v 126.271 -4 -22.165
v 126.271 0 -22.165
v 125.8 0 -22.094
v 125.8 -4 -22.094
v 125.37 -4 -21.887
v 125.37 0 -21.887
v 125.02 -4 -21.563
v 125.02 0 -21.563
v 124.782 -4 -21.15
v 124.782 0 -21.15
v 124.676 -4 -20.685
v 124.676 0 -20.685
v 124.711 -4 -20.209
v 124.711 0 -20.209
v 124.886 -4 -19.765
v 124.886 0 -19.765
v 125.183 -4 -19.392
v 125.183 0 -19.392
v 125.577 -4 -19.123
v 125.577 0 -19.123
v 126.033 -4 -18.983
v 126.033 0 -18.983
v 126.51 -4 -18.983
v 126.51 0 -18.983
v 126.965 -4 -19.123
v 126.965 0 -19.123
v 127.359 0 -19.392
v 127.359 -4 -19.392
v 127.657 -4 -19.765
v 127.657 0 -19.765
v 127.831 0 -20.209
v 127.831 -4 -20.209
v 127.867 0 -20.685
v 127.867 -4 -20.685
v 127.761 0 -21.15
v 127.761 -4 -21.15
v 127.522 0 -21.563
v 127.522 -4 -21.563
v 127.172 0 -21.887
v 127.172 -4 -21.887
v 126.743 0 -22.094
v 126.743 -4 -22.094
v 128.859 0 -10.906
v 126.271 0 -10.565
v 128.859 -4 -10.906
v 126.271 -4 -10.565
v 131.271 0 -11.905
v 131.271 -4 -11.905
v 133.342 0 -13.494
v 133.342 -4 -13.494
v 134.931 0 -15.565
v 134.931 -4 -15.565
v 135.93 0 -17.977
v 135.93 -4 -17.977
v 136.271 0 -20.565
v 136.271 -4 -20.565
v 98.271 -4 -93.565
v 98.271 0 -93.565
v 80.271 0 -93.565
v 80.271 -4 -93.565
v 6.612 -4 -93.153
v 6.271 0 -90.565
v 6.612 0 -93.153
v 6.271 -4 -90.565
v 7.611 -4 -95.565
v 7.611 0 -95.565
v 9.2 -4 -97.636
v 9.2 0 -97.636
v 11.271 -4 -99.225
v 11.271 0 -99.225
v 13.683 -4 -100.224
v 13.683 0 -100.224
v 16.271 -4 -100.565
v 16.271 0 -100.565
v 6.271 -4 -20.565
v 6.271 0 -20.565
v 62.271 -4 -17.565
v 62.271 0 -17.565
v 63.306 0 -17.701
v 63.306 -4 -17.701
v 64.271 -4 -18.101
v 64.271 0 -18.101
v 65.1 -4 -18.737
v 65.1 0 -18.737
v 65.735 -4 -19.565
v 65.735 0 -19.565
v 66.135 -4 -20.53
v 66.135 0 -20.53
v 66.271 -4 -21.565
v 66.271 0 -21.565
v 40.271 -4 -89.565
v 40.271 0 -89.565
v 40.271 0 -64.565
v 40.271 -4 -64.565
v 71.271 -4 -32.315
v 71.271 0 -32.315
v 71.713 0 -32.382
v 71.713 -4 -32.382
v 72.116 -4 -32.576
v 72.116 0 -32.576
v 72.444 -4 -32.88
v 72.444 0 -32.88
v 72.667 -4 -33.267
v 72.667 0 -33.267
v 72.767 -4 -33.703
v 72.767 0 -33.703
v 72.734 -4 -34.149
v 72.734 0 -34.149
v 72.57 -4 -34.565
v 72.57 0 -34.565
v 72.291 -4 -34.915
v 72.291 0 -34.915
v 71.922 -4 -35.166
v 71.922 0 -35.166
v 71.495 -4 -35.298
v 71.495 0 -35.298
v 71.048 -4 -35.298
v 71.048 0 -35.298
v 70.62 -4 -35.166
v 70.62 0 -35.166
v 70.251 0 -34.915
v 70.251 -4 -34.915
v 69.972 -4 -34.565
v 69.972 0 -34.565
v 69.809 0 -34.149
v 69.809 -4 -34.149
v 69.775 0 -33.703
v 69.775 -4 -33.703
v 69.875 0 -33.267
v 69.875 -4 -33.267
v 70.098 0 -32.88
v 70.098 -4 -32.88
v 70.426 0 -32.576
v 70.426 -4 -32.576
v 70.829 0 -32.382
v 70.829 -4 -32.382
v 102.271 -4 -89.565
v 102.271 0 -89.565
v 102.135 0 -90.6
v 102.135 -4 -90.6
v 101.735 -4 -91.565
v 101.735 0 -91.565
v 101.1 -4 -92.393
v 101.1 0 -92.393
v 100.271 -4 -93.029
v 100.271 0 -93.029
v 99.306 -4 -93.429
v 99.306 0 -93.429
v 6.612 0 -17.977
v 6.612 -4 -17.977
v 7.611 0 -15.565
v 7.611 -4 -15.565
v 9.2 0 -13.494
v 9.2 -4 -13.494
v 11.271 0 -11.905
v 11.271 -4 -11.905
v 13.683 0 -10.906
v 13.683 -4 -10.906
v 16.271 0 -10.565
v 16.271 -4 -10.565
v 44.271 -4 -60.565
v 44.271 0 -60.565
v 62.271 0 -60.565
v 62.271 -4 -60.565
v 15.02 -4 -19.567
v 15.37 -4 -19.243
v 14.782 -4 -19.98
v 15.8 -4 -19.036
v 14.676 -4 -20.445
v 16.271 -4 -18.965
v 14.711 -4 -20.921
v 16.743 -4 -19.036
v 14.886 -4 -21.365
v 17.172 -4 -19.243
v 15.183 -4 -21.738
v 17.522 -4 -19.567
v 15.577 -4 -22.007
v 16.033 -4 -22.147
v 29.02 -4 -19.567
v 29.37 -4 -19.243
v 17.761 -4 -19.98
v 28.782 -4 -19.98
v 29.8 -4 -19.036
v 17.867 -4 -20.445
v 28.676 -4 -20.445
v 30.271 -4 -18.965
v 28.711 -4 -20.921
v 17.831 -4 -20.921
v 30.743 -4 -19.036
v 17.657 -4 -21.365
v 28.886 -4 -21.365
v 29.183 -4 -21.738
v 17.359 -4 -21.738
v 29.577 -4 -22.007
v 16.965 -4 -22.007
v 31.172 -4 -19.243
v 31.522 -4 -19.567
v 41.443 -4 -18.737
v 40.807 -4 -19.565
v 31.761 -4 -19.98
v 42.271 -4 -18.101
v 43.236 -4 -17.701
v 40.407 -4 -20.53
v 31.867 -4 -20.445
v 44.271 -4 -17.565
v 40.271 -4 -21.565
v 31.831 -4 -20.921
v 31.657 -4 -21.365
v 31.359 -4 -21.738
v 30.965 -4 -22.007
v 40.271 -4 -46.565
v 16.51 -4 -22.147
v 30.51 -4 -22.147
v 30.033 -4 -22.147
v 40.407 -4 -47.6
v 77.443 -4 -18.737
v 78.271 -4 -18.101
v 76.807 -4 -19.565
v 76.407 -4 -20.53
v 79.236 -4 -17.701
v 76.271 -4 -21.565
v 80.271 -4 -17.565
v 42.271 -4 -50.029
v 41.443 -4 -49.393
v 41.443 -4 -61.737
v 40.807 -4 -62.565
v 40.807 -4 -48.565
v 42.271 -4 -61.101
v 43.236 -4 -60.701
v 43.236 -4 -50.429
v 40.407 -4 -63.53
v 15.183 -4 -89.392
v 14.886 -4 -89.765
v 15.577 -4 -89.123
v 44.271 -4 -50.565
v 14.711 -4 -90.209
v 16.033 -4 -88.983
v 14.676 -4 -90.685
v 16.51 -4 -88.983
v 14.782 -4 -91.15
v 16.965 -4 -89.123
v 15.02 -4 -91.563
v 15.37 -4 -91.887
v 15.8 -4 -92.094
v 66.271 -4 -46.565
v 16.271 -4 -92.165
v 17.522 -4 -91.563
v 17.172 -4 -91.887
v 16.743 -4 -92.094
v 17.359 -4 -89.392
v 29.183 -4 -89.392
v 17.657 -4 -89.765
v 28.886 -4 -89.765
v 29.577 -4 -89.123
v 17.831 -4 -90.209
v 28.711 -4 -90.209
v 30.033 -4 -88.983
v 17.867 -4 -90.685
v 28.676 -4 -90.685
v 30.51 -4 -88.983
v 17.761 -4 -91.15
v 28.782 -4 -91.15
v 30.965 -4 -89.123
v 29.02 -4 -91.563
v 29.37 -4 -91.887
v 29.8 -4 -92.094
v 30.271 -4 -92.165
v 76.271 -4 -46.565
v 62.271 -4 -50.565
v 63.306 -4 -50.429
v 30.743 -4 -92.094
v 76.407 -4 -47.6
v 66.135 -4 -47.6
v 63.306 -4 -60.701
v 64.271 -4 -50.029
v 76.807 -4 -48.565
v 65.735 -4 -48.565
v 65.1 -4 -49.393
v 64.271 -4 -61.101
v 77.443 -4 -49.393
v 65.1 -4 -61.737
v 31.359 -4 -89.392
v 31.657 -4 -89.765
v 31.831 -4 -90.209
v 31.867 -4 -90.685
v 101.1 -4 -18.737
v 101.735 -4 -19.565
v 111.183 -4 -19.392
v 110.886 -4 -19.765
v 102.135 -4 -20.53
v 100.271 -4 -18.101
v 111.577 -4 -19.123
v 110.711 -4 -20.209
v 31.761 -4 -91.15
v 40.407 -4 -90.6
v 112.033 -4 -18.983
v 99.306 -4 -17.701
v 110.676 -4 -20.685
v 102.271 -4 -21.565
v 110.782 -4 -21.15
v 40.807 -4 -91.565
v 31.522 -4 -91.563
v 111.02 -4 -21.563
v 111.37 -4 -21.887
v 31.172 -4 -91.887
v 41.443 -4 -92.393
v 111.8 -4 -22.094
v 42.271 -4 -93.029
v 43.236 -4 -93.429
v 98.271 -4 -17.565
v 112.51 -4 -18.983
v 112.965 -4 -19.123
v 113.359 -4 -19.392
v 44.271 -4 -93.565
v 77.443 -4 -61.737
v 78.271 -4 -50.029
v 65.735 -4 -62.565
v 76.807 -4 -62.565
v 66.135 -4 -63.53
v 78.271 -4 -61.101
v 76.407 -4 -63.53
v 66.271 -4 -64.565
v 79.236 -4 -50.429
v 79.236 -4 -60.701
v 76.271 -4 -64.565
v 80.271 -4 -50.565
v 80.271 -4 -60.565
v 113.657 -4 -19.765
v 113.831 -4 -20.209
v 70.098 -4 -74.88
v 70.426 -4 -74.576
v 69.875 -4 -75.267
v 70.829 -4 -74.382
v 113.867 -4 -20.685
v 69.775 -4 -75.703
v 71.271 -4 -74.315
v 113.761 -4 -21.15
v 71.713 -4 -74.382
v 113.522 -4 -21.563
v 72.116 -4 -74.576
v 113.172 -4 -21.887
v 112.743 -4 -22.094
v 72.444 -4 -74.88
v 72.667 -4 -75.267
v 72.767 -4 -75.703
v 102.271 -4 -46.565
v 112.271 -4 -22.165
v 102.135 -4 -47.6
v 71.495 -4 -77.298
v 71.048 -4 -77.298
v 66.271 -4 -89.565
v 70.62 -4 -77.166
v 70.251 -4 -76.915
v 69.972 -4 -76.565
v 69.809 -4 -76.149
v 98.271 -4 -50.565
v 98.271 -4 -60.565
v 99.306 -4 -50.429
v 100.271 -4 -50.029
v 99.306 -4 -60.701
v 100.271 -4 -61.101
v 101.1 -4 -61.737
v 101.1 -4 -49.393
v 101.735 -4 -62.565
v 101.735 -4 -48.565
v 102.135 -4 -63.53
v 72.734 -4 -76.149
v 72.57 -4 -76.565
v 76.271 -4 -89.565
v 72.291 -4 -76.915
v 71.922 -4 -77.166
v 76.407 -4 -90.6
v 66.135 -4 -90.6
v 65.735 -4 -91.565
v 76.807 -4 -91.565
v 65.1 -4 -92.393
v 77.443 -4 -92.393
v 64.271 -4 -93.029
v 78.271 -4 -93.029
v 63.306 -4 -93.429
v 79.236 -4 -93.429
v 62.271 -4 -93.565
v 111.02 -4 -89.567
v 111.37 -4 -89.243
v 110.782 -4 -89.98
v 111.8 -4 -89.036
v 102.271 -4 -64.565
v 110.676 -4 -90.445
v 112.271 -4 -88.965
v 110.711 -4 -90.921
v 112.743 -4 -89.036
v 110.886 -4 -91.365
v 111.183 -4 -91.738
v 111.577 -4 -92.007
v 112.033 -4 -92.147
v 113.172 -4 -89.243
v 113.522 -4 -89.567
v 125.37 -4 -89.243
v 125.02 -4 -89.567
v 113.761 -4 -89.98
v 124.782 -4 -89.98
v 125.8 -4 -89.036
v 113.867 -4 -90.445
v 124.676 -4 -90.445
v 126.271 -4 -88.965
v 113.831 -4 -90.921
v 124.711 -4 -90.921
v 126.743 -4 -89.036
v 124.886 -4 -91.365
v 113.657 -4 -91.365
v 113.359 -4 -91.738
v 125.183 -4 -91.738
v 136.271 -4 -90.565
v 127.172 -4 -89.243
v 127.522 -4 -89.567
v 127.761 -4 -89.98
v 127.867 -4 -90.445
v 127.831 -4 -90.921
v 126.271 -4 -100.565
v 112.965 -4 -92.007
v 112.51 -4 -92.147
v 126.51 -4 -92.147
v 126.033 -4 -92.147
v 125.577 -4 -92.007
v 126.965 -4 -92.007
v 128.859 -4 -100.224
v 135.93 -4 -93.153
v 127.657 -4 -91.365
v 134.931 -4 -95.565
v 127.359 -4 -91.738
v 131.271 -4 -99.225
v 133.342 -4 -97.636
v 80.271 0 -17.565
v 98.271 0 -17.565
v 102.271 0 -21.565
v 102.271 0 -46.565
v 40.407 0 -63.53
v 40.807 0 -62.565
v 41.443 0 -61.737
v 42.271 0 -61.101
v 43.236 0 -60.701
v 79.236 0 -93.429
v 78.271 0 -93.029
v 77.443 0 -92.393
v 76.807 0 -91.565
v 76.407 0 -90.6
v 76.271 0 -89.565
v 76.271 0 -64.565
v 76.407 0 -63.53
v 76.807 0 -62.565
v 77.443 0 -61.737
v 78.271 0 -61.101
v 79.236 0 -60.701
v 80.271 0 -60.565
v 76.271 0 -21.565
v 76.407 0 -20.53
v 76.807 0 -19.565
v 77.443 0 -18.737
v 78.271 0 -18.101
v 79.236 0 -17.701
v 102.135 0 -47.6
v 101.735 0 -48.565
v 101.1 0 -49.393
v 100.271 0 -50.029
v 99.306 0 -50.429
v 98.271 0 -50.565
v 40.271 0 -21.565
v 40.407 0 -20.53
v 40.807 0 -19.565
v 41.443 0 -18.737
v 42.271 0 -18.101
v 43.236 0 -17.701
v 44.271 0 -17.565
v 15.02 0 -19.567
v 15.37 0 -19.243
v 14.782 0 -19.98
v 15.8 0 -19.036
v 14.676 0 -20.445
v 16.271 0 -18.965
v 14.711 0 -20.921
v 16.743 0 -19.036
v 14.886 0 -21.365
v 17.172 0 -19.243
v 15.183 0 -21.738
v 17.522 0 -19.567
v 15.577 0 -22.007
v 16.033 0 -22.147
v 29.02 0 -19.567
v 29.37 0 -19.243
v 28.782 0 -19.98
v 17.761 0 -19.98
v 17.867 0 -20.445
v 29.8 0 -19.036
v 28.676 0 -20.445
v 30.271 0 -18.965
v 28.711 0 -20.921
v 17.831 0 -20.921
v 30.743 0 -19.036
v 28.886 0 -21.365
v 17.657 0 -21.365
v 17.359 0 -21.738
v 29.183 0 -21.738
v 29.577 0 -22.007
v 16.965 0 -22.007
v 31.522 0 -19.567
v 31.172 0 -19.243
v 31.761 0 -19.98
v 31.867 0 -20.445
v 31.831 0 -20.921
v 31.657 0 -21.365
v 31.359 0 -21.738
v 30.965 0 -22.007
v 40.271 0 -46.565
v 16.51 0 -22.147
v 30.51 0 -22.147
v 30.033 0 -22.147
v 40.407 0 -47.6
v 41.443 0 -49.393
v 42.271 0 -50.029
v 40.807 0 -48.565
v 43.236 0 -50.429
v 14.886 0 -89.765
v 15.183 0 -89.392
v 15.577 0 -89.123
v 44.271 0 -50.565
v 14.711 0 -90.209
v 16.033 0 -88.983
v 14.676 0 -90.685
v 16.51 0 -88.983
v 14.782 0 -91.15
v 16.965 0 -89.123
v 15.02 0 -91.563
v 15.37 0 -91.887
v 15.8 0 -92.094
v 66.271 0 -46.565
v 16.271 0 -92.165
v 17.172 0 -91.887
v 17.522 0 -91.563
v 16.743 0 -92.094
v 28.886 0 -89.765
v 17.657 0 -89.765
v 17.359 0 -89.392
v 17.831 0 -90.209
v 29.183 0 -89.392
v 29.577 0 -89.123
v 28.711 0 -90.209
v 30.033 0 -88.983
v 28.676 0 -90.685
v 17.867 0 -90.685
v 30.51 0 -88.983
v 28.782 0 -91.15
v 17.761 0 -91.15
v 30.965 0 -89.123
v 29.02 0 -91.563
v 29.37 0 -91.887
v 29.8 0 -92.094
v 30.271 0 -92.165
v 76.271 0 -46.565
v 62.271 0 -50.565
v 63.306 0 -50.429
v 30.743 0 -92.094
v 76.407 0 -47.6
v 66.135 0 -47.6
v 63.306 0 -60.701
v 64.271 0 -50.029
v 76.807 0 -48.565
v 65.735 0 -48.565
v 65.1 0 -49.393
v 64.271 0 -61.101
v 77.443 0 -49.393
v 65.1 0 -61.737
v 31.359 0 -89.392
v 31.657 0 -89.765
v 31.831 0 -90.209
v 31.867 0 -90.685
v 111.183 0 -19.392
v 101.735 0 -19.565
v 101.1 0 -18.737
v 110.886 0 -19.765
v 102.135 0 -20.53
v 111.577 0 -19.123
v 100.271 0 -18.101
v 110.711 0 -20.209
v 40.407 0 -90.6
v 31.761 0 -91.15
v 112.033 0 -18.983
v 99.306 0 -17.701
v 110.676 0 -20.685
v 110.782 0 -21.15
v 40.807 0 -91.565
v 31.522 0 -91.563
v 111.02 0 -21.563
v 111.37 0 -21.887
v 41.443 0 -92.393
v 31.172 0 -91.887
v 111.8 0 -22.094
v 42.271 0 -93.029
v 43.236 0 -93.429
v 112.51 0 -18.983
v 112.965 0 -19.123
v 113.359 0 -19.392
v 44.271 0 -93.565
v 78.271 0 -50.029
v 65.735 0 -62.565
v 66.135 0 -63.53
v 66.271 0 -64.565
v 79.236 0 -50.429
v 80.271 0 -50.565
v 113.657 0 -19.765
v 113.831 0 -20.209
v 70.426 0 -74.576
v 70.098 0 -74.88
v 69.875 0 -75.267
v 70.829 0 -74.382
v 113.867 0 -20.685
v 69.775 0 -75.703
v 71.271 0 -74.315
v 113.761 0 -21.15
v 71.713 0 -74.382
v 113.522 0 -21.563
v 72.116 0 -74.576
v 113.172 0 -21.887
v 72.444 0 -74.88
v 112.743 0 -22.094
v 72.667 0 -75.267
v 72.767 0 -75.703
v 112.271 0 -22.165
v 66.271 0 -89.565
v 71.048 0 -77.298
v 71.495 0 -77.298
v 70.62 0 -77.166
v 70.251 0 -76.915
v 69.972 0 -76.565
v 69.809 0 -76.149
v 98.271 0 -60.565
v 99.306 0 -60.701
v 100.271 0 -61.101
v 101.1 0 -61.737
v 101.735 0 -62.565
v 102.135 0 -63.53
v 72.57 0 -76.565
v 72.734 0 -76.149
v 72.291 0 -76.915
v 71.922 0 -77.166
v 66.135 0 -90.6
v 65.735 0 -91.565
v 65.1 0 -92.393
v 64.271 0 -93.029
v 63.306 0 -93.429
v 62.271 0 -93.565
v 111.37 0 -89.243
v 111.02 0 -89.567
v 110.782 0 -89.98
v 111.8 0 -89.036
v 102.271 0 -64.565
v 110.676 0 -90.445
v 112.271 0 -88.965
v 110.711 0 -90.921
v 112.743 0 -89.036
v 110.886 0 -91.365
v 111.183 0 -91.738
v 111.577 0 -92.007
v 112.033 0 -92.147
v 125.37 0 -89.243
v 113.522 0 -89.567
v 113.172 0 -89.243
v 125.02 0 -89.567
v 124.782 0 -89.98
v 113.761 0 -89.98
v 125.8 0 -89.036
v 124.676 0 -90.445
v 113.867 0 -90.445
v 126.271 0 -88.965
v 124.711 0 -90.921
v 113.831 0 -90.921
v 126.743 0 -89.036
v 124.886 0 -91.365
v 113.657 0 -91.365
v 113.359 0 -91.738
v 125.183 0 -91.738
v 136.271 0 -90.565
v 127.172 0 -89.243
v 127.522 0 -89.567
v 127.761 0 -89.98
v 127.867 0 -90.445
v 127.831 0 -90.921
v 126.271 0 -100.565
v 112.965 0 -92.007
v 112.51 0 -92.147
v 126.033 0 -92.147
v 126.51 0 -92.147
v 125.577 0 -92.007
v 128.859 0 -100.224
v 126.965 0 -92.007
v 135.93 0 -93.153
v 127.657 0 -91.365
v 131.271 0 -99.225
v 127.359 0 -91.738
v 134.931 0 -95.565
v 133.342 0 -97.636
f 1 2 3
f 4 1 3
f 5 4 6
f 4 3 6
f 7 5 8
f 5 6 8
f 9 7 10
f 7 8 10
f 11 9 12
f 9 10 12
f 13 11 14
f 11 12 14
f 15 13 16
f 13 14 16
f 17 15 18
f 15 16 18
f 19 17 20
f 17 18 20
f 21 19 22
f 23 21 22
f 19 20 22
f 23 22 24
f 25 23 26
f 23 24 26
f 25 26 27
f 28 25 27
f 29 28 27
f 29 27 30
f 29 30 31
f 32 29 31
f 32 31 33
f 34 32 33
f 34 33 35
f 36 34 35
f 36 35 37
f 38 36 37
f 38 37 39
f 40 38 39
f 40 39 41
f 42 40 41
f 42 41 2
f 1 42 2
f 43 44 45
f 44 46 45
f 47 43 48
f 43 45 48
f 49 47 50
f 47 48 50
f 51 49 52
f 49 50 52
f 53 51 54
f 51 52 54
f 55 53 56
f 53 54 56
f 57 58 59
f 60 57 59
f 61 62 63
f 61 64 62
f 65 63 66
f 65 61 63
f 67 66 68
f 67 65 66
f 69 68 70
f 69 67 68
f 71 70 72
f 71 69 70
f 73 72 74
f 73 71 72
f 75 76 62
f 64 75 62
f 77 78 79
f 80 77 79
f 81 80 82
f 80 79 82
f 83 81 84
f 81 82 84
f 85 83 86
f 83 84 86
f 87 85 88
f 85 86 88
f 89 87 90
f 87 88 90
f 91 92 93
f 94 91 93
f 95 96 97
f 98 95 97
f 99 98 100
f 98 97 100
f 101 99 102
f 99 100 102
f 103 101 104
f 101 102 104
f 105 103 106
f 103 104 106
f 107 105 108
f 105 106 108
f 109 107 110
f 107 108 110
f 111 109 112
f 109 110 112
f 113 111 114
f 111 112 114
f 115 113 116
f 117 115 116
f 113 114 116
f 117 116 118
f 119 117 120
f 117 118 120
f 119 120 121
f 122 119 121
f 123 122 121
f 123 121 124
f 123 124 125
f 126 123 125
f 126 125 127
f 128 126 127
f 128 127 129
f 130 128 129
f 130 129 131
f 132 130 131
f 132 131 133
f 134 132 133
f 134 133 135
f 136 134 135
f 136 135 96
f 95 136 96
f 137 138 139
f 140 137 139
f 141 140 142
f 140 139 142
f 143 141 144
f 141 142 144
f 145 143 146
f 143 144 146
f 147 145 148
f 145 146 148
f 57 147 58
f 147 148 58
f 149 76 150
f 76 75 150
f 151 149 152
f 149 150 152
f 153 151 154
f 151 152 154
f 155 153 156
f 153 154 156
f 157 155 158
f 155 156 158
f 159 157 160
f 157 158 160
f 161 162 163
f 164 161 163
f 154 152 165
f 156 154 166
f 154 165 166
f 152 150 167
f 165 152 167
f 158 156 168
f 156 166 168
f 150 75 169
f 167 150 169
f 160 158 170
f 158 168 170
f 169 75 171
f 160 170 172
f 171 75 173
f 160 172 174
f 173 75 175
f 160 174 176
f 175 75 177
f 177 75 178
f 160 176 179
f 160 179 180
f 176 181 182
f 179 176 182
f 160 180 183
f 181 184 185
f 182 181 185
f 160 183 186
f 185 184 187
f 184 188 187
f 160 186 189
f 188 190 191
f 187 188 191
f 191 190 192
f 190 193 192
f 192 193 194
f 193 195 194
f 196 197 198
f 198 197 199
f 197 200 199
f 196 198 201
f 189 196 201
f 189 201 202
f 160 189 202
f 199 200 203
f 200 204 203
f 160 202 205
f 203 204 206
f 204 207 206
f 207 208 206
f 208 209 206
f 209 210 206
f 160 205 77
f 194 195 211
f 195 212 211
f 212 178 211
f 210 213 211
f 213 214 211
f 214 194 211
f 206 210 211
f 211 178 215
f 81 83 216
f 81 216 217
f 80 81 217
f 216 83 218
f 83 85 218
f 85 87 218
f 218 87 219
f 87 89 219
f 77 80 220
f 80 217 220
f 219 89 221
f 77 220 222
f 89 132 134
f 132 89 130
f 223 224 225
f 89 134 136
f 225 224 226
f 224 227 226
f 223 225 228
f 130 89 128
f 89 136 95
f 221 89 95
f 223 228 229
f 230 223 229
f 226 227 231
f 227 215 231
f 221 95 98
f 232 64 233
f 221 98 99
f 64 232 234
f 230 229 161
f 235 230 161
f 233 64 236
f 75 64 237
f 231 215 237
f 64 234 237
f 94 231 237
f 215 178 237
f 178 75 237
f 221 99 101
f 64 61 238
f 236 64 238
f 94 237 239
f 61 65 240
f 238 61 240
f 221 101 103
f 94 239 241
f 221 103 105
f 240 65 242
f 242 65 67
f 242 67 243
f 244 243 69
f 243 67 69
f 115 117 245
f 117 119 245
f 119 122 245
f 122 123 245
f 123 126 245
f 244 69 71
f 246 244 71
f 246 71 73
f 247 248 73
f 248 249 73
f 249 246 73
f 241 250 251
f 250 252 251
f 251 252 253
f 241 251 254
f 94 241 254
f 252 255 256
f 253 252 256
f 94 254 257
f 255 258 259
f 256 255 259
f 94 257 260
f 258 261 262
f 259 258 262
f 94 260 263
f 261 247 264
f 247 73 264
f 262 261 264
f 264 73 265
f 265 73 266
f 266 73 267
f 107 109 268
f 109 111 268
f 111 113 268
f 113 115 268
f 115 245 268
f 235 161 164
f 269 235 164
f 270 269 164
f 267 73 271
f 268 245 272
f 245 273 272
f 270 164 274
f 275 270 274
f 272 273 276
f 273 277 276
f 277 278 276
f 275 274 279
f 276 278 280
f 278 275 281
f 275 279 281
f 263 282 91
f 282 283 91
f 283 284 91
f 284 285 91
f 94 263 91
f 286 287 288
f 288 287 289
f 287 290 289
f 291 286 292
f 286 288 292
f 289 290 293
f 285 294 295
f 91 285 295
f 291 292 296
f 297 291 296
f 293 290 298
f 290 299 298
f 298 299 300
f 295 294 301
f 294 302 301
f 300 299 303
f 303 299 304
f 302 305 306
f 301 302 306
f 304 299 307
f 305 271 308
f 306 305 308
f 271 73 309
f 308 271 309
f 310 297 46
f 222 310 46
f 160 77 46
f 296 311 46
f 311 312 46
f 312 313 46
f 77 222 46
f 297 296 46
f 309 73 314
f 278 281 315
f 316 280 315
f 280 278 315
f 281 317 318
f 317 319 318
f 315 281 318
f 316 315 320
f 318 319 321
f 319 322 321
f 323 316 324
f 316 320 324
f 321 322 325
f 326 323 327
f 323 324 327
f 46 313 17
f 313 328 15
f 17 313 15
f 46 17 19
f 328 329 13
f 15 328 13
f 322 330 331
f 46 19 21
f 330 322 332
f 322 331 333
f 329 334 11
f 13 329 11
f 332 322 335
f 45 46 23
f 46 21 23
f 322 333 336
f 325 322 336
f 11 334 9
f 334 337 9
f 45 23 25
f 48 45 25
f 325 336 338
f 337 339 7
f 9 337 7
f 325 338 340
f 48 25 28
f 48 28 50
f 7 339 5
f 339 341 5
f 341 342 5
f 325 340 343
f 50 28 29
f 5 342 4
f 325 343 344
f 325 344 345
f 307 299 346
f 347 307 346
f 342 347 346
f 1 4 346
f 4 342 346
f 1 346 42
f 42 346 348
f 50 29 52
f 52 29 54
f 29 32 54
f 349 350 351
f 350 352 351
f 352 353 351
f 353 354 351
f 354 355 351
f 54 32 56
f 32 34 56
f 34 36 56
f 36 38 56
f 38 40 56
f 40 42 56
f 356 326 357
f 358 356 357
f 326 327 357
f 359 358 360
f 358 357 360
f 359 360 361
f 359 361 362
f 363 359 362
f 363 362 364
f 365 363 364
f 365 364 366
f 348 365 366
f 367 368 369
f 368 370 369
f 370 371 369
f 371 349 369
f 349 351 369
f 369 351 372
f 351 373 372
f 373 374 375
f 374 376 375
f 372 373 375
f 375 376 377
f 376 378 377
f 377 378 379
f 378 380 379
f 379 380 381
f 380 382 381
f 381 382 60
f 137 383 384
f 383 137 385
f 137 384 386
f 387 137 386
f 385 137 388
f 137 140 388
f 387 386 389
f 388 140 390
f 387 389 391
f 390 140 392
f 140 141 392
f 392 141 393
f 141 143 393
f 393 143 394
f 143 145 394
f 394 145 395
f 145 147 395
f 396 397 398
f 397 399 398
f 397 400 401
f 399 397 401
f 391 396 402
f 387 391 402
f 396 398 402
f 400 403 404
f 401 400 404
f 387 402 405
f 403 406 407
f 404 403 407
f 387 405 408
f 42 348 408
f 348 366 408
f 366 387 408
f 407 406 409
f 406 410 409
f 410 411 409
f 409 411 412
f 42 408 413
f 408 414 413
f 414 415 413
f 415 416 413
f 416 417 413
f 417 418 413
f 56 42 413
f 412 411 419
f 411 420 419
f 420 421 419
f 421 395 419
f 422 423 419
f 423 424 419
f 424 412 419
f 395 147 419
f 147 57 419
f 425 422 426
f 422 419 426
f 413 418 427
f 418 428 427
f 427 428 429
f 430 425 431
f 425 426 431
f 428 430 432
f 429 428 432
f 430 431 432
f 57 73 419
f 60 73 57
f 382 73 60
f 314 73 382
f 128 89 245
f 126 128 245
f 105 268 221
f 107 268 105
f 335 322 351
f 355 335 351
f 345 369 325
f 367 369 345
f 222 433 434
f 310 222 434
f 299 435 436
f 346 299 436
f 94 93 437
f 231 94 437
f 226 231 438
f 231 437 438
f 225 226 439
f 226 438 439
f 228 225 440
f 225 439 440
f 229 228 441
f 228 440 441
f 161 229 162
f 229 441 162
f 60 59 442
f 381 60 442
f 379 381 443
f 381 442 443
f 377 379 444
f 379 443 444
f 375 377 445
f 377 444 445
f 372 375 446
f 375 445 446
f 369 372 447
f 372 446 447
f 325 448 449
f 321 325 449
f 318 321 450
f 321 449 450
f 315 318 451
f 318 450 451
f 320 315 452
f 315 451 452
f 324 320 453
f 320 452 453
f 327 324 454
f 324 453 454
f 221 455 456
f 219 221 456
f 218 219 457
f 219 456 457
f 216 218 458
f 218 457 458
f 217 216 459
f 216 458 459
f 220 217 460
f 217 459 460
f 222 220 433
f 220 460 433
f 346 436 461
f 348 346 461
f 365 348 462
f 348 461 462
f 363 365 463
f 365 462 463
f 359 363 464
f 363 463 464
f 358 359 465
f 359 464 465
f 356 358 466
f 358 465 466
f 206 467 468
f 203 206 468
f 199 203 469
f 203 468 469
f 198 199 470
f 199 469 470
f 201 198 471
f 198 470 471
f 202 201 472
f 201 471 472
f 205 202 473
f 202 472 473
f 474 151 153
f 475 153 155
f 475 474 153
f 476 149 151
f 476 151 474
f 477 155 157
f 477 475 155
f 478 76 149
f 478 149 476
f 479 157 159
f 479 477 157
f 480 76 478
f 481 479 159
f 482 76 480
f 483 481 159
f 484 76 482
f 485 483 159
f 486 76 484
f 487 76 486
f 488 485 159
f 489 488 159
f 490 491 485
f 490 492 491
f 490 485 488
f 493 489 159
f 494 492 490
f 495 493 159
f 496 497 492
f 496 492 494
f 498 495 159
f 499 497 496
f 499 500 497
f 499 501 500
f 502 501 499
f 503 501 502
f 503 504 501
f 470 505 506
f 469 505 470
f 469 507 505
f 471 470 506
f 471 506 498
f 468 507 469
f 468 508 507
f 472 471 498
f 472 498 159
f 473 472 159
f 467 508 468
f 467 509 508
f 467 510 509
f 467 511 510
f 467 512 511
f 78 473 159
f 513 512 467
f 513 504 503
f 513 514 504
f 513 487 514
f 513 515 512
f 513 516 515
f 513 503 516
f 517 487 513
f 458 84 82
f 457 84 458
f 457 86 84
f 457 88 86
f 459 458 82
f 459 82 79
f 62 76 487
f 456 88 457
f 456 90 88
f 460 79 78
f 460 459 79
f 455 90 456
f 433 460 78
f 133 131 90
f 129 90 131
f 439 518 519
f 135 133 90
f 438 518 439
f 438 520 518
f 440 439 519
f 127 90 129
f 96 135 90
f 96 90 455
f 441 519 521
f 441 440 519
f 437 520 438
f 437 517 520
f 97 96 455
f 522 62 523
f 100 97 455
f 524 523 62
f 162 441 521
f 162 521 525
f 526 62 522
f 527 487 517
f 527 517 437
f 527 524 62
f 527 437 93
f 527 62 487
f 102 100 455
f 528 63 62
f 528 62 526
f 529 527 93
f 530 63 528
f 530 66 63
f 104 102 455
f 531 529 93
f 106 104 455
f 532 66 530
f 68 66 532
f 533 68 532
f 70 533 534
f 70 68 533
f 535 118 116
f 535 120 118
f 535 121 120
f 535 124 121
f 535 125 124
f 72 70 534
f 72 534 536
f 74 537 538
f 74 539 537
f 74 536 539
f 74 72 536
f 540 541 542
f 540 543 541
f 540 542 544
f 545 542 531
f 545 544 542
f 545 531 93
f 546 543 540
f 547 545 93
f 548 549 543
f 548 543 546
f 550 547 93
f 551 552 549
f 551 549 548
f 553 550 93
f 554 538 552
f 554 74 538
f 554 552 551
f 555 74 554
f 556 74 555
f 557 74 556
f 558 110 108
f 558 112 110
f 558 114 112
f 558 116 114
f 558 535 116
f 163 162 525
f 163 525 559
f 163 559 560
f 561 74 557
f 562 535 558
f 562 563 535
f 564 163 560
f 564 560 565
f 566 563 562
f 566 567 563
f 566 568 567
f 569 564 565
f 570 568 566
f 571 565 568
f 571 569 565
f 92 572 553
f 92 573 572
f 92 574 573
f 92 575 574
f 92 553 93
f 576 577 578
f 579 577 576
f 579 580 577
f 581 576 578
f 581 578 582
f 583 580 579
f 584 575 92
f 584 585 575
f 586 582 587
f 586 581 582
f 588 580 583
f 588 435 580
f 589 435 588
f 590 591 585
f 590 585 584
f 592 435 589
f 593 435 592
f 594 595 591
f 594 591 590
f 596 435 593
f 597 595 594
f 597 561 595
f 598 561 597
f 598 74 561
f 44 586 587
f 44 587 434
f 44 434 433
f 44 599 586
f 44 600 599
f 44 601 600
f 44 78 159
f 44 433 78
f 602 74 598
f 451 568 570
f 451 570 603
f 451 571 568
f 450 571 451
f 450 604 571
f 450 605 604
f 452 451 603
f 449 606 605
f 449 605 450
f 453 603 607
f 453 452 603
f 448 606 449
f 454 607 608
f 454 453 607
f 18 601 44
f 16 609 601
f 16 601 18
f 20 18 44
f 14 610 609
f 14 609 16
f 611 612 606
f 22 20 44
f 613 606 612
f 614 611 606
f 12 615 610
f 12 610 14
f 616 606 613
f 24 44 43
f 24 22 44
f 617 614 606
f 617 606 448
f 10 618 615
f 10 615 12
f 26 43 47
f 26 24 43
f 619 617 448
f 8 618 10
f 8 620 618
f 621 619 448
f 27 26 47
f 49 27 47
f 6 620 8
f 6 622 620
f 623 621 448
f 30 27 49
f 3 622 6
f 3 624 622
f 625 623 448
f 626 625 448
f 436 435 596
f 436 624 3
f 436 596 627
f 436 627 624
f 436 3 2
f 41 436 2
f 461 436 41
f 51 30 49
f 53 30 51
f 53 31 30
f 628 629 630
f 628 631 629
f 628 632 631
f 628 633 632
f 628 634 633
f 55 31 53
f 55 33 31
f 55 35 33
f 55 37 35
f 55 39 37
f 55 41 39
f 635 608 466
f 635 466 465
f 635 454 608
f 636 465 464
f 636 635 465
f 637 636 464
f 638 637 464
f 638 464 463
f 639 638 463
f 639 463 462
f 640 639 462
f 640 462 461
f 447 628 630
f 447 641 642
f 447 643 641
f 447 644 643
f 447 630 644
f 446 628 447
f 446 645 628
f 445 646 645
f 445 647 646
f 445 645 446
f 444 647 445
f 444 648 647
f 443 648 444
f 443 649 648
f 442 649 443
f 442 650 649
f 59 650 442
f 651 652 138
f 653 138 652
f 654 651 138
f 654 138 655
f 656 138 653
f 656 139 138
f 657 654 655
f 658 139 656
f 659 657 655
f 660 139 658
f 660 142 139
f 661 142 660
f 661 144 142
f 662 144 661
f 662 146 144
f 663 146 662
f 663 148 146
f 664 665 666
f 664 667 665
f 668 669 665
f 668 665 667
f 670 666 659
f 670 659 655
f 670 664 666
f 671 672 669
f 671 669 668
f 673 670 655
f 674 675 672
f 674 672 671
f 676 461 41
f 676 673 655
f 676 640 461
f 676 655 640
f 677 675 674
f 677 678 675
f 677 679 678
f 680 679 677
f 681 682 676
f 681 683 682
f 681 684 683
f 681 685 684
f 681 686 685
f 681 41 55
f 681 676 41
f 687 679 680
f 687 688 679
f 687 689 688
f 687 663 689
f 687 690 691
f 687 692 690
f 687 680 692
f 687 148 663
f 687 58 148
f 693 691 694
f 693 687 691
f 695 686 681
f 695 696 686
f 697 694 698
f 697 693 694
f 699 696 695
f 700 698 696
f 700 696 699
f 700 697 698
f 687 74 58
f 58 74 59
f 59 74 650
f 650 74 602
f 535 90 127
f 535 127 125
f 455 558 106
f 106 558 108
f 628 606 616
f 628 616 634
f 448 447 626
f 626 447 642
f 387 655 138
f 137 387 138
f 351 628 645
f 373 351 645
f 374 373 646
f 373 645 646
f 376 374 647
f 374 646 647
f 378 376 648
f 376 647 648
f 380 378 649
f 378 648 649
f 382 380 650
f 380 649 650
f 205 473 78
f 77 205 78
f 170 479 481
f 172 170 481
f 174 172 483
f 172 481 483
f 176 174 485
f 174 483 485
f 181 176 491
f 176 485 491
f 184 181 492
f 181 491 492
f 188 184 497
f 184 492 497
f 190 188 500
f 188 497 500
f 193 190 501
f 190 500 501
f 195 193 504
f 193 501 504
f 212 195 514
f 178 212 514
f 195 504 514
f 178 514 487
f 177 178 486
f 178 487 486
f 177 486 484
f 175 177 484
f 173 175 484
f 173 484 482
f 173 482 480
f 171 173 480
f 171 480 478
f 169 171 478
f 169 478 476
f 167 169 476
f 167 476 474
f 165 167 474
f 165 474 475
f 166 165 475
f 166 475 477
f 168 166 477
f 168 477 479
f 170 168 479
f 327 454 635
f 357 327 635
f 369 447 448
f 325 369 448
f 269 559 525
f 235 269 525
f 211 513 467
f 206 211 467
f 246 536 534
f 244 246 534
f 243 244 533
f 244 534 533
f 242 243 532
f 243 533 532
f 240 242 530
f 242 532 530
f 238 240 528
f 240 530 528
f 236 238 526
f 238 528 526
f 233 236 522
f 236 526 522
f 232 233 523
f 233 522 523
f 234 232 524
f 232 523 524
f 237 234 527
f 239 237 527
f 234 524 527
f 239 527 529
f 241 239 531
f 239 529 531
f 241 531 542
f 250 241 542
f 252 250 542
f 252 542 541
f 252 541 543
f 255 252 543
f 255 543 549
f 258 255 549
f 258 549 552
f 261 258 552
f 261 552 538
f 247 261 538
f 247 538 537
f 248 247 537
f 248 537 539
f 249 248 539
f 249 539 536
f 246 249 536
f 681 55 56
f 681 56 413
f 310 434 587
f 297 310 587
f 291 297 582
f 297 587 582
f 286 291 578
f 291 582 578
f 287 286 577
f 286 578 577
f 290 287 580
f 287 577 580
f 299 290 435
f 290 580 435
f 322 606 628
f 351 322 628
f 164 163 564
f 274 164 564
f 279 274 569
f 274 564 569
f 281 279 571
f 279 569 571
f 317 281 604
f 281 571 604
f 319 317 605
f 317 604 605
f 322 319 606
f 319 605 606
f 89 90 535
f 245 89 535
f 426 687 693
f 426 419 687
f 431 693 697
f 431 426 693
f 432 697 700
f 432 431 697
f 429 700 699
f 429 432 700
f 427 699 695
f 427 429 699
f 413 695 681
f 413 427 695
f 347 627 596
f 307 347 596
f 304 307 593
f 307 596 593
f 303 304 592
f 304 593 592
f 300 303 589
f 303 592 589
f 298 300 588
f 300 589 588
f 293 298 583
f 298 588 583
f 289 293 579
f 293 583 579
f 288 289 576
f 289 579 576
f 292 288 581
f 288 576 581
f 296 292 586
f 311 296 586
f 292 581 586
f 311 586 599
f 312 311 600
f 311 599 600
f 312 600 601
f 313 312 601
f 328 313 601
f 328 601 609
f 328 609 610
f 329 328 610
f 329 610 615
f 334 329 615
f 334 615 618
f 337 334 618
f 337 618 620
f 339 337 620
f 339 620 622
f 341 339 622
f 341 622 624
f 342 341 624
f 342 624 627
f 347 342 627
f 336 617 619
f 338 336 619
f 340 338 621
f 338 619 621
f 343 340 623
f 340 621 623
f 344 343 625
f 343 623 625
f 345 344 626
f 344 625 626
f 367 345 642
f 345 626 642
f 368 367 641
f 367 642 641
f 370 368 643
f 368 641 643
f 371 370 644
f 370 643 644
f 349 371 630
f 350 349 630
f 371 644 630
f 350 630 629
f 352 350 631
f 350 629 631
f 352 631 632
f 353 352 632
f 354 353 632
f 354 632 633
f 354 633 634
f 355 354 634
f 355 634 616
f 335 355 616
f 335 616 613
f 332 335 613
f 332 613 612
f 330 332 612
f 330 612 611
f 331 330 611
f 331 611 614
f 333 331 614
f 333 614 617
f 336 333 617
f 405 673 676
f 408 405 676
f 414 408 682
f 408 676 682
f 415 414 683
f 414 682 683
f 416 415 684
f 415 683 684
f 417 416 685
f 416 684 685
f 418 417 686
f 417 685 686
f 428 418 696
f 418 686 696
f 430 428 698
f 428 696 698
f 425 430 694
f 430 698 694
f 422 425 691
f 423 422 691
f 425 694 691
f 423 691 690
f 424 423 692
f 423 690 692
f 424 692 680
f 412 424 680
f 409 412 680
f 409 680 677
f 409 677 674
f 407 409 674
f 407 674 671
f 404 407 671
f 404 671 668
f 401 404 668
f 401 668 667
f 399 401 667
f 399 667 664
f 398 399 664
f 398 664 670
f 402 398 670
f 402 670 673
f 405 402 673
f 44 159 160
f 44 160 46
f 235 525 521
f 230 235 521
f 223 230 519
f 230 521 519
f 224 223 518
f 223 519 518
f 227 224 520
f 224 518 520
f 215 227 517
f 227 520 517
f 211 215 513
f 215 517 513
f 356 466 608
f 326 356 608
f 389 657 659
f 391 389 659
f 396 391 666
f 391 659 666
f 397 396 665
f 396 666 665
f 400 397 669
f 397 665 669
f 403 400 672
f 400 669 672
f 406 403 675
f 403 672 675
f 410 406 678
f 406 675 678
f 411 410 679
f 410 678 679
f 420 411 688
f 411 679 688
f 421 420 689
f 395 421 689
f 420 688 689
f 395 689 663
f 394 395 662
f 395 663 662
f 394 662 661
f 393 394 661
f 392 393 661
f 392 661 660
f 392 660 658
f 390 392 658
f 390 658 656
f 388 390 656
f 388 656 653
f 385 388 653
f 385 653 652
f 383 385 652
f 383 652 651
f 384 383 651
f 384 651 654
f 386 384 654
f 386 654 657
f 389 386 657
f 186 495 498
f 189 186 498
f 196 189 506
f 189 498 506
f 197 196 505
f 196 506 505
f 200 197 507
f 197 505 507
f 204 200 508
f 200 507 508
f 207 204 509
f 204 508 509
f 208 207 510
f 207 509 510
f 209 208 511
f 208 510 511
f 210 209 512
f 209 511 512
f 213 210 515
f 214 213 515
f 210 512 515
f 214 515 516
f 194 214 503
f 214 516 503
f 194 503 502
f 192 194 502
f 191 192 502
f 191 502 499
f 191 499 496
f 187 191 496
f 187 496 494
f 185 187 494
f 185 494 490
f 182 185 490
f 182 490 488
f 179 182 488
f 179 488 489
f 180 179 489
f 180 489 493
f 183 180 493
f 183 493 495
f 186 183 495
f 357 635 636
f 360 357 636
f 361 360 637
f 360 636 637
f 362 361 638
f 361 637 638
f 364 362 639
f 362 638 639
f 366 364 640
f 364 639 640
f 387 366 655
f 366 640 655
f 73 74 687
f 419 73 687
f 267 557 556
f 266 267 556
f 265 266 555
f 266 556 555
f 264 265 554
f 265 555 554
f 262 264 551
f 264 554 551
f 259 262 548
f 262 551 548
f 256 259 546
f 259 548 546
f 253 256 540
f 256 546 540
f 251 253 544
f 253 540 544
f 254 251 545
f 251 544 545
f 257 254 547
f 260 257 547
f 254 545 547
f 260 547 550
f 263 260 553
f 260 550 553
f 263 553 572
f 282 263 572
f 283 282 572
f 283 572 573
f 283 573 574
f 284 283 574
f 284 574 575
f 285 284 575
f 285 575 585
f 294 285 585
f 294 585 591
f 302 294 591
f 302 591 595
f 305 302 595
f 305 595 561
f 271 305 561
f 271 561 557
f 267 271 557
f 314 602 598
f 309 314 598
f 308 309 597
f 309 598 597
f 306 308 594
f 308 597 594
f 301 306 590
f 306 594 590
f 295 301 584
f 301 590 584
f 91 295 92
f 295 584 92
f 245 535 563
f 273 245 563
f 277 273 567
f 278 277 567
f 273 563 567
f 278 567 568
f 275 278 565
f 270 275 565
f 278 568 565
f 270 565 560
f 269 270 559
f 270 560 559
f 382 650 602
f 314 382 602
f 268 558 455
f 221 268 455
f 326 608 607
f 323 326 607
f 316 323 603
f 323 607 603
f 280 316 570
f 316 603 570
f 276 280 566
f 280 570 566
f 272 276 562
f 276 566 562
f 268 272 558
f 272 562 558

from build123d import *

# Parameters (mm, degrees)
SKETCH2_W           = 130
SKETCH2_H           = 90
BOSS_EXTRUDE1_DEPTH = 4
SKETCH3_R           = 1.5
CUT_EXTRUDE1_DEPTH  = 10
SKETCH4_R           = 1.6
CUT_EXTRUDE2_DEPTH  = 10
FILLET1_R           = 10
CUT_EXTRUDE3_DEPTH  = 10
SKETCH6_R           = 1.5
BOSS_EXTRUDE2_DEPTH = 4
SKETCH7_R           = 1.5
CUT_EXTRUDE4_DEPTH  = 10


with BuildPart() as part:
    # Sketch2 → Boss-Extrude1 (new body)
    with BuildSketch(Plane(origin=(0, 0, 0), x_dir=(1, 0, 0), z_dir=(0, 1, 0))):
        with Locations((71.271186441, 55.564971751)):
            Rectangle(SKETCH2_W, SKETCH2_H)
    extrude(amount=-BOSS_EXTRUDE1_DEPTH)

    # Sketch3 → Cut-Extrude1 (cut)
    with BuildSketch(Plane(origin=(0, 0, 0), x_dir=(1, 0, 0), z_dir=(0, 1, 0))):
        with Locations(Location((126.271186441, 63.564971751, 0), (0, 0, 270))):
            Circle(SKETCH3_R)
        with Locations(Location((126.271186441, 47.564971751, 0), (0, 0, 270))):
            Circle(SKETCH3_R)
        with Locations(Location((112.271186441, 47.564971751, 0), (0, 0, 270))):
            Circle(SKETCH3_R)
        with Locations(Location((112.271186441, 63.564971751, 0), (0, 0, 270))):
            Circle(SKETCH3_R)
        with Locations(Location((16.271186441, 47.564971751, 0), (0, 0, 90))):
            Circle(SKETCH3_R)
        with Locations(Location((30.271186441, 47.564971751, 0), (0, 0, 90))):
            Circle(SKETCH3_R)
        with Locations(Location((16.271186441, 63.564971751, 0), (0, 0, 90))):
            Circle(SKETCH3_R)
        with Locations(Location((30.271186441, 63.564971751, 0), (0, 0, 90))):
            Circle(SKETCH3_R)
    extrude(amount=-CUT_EXTRUDE1_DEPTH, mode=Mode.SUBTRACT)

    # Sketch4 → Cut-Extrude2 (cut)
    with BuildSketch(Plane(origin=(0, 0, 0), x_dir=(1, 0, 0), z_dir=(0, 1, 0))):
        with Locations(Location((16.271186441, 20.564971751, 0), (0, 0, 270))):
            Circle(SKETCH4_R)
        with Locations(Location((30.271186441, 20.564971751, 0), (0, 0, 270))):
            Circle(SKETCH4_R)
        with Locations(Location((30.271186441, 90.564971751, 0), (0, 0, 90))):
            Circle(SKETCH4_R)
        with Locations(Location((16.271186441, 90.564971751, 0), (0, 0, 90))):
            Circle(SKETCH4_R)
        with Locations(Location((112.271186441, 20.564971751, 0), (0, 0, 90))):
            Circle(SKETCH4_R)
        with Locations(Location((126.271186441, 20.564971751, 0), (0, 0, 90))):
            Circle(SKETCH4_R)
        with Locations(Location((126.271186441, 90.564971751, 0), (0, 0, 270))):
            Circle(SKETCH4_R)
        with Locations(Location((112.271186441, 90.564971751, 0), (0, 0, 270))):
            Circle(SKETCH4_R)
    extrude(amount=-CUT_EXTRUDE2_DEPTH, mode=Mode.SUBTRACT)

    # Fillet1
    fillet1_edges = [part.edges().sort_by_distance(p)[0] for p in [
        (6.271186441, -2, -100.564971751),
        (136.271186441, -2, -100.564971751),
        (136.271186441, -2, -10.564971751),
        (6.271186441, -2, -10.564971751),
    ]]
    fillet(fillet1_edges, radius=FILLET1_R)

    # Sketch5 → Cut-Extrude3 (cut)
    with BuildSketch(Plane(origin=(0, 0, 0), x_dir=(1, 0, 0), z_dir=(0, 1, 0))):
        with BuildLine():
            Line((76.271186441, 89.564971751), (76.271186441, 64.564971751))
            ThreePointArc((76.271186441, 64.564971751), (77.442759316, 61.736544627), (80.271186441, 60.564971751))
            Line((80.271186441, 60.564971751), (98.271186441, 60.564971751))
            ThreePointArc((98.271186441, 60.564971751), (101.099613565, 61.736544627), (102.271186441, 64.564971751))
            Line((102.271186441, 64.564971751), (102.271186441, 89.564971751))
            ThreePointArc((102.271186441, 89.564971751), (101.099613565, 92.393398876), (98.271186441, 93.564971751))
            Line((98.271186441, 93.564971751), (80.271186441, 93.564971751))
            ThreePointArc((80.271186441, 93.564971751), (77.442759316, 92.393398876), (76.271186441, 89.564971751))
        make_face()
        with BuildLine():
            Line((40.271186441, 89.564971751), (40.271186441, 64.564971751))
            ThreePointArc((40.271186441, 64.564971751), (41.442759316, 61.736544627), (44.271186441, 60.564971751))
            Line((44.271186441, 60.564971751), (62.271186441, 60.564971751))
            ThreePointArc((62.271186441, 60.564971751), (65.099613565, 61.736544627), (66.271186441, 64.564971751))
            Line((66.271186441, 64.564971751), (66.271186441, 89.564971751))
            ThreePointArc((66.271186441, 89.564971751), (65.099613565, 92.393398876), (62.271186441, 93.564971751))
            Line((62.271186441, 93.564971751), (44.271186441, 93.564971751))
            ThreePointArc((44.271186441, 93.564971751), (41.442759316, 92.393398876), (40.271186441, 89.564971751))
        make_face()
        with BuildLine():
            Line((66.271186441, 21.564971751), (66.271186441, 46.564971751))
            ThreePointArc((66.271186441, 46.564971751), (65.099613565, 49.393398876), (62.271186441, 50.564971751))
            Line((62.271186441, 50.564971751), (44.271186441, 50.564971751))
            ThreePointArc((44.271186441, 50.564971751), (41.442759316, 49.393398876), (40.271186441, 46.564971751))
            Line((40.271186441, 46.564971751), (40.271186441, 21.564971751))
            ThreePointArc((40.271186441, 21.564971751), (41.442759316, 18.736544627), (44.271186441, 17.564971751))
            Line((44.271186441, 17.564971751), (62.271186441, 17.564971751))
            ThreePointArc((62.271186441, 17.564971751), (65.099613565, 18.736544627), (66.271186441, 21.564971751))
        make_face()
        with BuildLine():
            Line((102.271186441, 21.564971751), (102.271186441, 46.564971751))
            ThreePointArc((102.271186441, 46.564971751), (101.099613565, 49.393398876), (98.271186441, 50.564971751))
            Line((98.271186441, 50.564971751), (80.271186441, 50.564971751))
            ThreePointArc((80.271186441, 50.564971751), (77.442759316, 49.393398876), (76.271186441, 46.564971751))
            Line((76.271186441, 46.564971751), (76.271186441, 21.564971751))
            ThreePointArc((76.271186441, 21.564971751), (77.442759316, 18.736544627), (80.271186441, 17.564971751))
            Line((80.271186441, 17.564971751), (98.271186441, 17.564971751))
            ThreePointArc((98.271186441, 17.564971751), (101.099613565, 18.736544627), (102.271186441, 21.564971751))
        make_face()
    extrude(amount=-CUT_EXTRUDE3_DEPTH, mode=Mode.SUBTRACT)

    # Sketch6 → Boss-Extrude2 (add)
    with BuildSketch(Plane(origin=(0, 0, 0), x_dir=(1, 0, 0), z_dir=(0, 1, 0))):
        with Locations((30.271186441, 63.564971751)):
            Circle(SKETCH6_R)
        with Locations((30.271186441, 47.564971751)):
            Circle(SKETCH6_R)
        with Locations((16.271186441, 47.564971751)):
            Circle(SKETCH6_R)
        with Locations((16.271186441, 63.564971751)):
            Circle(SKETCH6_R)
        with Locations((112.271186441, 63.564971751)):
            Circle(SKETCH6_R)
        with Locations((126.271186441, 63.564971751)):
            Circle(SKETCH6_R)
        with Locations((126.271186441, 47.564971751)):
            Circle(SKETCH6_R)
        with Locations((112.271186441, 47.564971751)):
            Circle(SKETCH6_R)
    extrude(amount=-BOSS_EXTRUDE2_DEPTH)

    # Sketch7 → Cut-Extrude4 (cut)
    with BuildSketch(Plane(origin=(0, 0, 0), x_dir=(1, 0, 0), z_dir=(0, 1, 0))):
        with Locations(Location((71.271186441, 75.814971751, 0), (0, 0, 270))):
            Circle(SKETCH7_R)
        with Locations(Location((71.271186441, 33.814971751, 0), (0, 0, 270))):
            Circle(SKETCH7_R)
    extrude(amount=-CUT_EXTRUDE4_DEPTH, mode=Mode.SUBTRACT)


solid = part.part
